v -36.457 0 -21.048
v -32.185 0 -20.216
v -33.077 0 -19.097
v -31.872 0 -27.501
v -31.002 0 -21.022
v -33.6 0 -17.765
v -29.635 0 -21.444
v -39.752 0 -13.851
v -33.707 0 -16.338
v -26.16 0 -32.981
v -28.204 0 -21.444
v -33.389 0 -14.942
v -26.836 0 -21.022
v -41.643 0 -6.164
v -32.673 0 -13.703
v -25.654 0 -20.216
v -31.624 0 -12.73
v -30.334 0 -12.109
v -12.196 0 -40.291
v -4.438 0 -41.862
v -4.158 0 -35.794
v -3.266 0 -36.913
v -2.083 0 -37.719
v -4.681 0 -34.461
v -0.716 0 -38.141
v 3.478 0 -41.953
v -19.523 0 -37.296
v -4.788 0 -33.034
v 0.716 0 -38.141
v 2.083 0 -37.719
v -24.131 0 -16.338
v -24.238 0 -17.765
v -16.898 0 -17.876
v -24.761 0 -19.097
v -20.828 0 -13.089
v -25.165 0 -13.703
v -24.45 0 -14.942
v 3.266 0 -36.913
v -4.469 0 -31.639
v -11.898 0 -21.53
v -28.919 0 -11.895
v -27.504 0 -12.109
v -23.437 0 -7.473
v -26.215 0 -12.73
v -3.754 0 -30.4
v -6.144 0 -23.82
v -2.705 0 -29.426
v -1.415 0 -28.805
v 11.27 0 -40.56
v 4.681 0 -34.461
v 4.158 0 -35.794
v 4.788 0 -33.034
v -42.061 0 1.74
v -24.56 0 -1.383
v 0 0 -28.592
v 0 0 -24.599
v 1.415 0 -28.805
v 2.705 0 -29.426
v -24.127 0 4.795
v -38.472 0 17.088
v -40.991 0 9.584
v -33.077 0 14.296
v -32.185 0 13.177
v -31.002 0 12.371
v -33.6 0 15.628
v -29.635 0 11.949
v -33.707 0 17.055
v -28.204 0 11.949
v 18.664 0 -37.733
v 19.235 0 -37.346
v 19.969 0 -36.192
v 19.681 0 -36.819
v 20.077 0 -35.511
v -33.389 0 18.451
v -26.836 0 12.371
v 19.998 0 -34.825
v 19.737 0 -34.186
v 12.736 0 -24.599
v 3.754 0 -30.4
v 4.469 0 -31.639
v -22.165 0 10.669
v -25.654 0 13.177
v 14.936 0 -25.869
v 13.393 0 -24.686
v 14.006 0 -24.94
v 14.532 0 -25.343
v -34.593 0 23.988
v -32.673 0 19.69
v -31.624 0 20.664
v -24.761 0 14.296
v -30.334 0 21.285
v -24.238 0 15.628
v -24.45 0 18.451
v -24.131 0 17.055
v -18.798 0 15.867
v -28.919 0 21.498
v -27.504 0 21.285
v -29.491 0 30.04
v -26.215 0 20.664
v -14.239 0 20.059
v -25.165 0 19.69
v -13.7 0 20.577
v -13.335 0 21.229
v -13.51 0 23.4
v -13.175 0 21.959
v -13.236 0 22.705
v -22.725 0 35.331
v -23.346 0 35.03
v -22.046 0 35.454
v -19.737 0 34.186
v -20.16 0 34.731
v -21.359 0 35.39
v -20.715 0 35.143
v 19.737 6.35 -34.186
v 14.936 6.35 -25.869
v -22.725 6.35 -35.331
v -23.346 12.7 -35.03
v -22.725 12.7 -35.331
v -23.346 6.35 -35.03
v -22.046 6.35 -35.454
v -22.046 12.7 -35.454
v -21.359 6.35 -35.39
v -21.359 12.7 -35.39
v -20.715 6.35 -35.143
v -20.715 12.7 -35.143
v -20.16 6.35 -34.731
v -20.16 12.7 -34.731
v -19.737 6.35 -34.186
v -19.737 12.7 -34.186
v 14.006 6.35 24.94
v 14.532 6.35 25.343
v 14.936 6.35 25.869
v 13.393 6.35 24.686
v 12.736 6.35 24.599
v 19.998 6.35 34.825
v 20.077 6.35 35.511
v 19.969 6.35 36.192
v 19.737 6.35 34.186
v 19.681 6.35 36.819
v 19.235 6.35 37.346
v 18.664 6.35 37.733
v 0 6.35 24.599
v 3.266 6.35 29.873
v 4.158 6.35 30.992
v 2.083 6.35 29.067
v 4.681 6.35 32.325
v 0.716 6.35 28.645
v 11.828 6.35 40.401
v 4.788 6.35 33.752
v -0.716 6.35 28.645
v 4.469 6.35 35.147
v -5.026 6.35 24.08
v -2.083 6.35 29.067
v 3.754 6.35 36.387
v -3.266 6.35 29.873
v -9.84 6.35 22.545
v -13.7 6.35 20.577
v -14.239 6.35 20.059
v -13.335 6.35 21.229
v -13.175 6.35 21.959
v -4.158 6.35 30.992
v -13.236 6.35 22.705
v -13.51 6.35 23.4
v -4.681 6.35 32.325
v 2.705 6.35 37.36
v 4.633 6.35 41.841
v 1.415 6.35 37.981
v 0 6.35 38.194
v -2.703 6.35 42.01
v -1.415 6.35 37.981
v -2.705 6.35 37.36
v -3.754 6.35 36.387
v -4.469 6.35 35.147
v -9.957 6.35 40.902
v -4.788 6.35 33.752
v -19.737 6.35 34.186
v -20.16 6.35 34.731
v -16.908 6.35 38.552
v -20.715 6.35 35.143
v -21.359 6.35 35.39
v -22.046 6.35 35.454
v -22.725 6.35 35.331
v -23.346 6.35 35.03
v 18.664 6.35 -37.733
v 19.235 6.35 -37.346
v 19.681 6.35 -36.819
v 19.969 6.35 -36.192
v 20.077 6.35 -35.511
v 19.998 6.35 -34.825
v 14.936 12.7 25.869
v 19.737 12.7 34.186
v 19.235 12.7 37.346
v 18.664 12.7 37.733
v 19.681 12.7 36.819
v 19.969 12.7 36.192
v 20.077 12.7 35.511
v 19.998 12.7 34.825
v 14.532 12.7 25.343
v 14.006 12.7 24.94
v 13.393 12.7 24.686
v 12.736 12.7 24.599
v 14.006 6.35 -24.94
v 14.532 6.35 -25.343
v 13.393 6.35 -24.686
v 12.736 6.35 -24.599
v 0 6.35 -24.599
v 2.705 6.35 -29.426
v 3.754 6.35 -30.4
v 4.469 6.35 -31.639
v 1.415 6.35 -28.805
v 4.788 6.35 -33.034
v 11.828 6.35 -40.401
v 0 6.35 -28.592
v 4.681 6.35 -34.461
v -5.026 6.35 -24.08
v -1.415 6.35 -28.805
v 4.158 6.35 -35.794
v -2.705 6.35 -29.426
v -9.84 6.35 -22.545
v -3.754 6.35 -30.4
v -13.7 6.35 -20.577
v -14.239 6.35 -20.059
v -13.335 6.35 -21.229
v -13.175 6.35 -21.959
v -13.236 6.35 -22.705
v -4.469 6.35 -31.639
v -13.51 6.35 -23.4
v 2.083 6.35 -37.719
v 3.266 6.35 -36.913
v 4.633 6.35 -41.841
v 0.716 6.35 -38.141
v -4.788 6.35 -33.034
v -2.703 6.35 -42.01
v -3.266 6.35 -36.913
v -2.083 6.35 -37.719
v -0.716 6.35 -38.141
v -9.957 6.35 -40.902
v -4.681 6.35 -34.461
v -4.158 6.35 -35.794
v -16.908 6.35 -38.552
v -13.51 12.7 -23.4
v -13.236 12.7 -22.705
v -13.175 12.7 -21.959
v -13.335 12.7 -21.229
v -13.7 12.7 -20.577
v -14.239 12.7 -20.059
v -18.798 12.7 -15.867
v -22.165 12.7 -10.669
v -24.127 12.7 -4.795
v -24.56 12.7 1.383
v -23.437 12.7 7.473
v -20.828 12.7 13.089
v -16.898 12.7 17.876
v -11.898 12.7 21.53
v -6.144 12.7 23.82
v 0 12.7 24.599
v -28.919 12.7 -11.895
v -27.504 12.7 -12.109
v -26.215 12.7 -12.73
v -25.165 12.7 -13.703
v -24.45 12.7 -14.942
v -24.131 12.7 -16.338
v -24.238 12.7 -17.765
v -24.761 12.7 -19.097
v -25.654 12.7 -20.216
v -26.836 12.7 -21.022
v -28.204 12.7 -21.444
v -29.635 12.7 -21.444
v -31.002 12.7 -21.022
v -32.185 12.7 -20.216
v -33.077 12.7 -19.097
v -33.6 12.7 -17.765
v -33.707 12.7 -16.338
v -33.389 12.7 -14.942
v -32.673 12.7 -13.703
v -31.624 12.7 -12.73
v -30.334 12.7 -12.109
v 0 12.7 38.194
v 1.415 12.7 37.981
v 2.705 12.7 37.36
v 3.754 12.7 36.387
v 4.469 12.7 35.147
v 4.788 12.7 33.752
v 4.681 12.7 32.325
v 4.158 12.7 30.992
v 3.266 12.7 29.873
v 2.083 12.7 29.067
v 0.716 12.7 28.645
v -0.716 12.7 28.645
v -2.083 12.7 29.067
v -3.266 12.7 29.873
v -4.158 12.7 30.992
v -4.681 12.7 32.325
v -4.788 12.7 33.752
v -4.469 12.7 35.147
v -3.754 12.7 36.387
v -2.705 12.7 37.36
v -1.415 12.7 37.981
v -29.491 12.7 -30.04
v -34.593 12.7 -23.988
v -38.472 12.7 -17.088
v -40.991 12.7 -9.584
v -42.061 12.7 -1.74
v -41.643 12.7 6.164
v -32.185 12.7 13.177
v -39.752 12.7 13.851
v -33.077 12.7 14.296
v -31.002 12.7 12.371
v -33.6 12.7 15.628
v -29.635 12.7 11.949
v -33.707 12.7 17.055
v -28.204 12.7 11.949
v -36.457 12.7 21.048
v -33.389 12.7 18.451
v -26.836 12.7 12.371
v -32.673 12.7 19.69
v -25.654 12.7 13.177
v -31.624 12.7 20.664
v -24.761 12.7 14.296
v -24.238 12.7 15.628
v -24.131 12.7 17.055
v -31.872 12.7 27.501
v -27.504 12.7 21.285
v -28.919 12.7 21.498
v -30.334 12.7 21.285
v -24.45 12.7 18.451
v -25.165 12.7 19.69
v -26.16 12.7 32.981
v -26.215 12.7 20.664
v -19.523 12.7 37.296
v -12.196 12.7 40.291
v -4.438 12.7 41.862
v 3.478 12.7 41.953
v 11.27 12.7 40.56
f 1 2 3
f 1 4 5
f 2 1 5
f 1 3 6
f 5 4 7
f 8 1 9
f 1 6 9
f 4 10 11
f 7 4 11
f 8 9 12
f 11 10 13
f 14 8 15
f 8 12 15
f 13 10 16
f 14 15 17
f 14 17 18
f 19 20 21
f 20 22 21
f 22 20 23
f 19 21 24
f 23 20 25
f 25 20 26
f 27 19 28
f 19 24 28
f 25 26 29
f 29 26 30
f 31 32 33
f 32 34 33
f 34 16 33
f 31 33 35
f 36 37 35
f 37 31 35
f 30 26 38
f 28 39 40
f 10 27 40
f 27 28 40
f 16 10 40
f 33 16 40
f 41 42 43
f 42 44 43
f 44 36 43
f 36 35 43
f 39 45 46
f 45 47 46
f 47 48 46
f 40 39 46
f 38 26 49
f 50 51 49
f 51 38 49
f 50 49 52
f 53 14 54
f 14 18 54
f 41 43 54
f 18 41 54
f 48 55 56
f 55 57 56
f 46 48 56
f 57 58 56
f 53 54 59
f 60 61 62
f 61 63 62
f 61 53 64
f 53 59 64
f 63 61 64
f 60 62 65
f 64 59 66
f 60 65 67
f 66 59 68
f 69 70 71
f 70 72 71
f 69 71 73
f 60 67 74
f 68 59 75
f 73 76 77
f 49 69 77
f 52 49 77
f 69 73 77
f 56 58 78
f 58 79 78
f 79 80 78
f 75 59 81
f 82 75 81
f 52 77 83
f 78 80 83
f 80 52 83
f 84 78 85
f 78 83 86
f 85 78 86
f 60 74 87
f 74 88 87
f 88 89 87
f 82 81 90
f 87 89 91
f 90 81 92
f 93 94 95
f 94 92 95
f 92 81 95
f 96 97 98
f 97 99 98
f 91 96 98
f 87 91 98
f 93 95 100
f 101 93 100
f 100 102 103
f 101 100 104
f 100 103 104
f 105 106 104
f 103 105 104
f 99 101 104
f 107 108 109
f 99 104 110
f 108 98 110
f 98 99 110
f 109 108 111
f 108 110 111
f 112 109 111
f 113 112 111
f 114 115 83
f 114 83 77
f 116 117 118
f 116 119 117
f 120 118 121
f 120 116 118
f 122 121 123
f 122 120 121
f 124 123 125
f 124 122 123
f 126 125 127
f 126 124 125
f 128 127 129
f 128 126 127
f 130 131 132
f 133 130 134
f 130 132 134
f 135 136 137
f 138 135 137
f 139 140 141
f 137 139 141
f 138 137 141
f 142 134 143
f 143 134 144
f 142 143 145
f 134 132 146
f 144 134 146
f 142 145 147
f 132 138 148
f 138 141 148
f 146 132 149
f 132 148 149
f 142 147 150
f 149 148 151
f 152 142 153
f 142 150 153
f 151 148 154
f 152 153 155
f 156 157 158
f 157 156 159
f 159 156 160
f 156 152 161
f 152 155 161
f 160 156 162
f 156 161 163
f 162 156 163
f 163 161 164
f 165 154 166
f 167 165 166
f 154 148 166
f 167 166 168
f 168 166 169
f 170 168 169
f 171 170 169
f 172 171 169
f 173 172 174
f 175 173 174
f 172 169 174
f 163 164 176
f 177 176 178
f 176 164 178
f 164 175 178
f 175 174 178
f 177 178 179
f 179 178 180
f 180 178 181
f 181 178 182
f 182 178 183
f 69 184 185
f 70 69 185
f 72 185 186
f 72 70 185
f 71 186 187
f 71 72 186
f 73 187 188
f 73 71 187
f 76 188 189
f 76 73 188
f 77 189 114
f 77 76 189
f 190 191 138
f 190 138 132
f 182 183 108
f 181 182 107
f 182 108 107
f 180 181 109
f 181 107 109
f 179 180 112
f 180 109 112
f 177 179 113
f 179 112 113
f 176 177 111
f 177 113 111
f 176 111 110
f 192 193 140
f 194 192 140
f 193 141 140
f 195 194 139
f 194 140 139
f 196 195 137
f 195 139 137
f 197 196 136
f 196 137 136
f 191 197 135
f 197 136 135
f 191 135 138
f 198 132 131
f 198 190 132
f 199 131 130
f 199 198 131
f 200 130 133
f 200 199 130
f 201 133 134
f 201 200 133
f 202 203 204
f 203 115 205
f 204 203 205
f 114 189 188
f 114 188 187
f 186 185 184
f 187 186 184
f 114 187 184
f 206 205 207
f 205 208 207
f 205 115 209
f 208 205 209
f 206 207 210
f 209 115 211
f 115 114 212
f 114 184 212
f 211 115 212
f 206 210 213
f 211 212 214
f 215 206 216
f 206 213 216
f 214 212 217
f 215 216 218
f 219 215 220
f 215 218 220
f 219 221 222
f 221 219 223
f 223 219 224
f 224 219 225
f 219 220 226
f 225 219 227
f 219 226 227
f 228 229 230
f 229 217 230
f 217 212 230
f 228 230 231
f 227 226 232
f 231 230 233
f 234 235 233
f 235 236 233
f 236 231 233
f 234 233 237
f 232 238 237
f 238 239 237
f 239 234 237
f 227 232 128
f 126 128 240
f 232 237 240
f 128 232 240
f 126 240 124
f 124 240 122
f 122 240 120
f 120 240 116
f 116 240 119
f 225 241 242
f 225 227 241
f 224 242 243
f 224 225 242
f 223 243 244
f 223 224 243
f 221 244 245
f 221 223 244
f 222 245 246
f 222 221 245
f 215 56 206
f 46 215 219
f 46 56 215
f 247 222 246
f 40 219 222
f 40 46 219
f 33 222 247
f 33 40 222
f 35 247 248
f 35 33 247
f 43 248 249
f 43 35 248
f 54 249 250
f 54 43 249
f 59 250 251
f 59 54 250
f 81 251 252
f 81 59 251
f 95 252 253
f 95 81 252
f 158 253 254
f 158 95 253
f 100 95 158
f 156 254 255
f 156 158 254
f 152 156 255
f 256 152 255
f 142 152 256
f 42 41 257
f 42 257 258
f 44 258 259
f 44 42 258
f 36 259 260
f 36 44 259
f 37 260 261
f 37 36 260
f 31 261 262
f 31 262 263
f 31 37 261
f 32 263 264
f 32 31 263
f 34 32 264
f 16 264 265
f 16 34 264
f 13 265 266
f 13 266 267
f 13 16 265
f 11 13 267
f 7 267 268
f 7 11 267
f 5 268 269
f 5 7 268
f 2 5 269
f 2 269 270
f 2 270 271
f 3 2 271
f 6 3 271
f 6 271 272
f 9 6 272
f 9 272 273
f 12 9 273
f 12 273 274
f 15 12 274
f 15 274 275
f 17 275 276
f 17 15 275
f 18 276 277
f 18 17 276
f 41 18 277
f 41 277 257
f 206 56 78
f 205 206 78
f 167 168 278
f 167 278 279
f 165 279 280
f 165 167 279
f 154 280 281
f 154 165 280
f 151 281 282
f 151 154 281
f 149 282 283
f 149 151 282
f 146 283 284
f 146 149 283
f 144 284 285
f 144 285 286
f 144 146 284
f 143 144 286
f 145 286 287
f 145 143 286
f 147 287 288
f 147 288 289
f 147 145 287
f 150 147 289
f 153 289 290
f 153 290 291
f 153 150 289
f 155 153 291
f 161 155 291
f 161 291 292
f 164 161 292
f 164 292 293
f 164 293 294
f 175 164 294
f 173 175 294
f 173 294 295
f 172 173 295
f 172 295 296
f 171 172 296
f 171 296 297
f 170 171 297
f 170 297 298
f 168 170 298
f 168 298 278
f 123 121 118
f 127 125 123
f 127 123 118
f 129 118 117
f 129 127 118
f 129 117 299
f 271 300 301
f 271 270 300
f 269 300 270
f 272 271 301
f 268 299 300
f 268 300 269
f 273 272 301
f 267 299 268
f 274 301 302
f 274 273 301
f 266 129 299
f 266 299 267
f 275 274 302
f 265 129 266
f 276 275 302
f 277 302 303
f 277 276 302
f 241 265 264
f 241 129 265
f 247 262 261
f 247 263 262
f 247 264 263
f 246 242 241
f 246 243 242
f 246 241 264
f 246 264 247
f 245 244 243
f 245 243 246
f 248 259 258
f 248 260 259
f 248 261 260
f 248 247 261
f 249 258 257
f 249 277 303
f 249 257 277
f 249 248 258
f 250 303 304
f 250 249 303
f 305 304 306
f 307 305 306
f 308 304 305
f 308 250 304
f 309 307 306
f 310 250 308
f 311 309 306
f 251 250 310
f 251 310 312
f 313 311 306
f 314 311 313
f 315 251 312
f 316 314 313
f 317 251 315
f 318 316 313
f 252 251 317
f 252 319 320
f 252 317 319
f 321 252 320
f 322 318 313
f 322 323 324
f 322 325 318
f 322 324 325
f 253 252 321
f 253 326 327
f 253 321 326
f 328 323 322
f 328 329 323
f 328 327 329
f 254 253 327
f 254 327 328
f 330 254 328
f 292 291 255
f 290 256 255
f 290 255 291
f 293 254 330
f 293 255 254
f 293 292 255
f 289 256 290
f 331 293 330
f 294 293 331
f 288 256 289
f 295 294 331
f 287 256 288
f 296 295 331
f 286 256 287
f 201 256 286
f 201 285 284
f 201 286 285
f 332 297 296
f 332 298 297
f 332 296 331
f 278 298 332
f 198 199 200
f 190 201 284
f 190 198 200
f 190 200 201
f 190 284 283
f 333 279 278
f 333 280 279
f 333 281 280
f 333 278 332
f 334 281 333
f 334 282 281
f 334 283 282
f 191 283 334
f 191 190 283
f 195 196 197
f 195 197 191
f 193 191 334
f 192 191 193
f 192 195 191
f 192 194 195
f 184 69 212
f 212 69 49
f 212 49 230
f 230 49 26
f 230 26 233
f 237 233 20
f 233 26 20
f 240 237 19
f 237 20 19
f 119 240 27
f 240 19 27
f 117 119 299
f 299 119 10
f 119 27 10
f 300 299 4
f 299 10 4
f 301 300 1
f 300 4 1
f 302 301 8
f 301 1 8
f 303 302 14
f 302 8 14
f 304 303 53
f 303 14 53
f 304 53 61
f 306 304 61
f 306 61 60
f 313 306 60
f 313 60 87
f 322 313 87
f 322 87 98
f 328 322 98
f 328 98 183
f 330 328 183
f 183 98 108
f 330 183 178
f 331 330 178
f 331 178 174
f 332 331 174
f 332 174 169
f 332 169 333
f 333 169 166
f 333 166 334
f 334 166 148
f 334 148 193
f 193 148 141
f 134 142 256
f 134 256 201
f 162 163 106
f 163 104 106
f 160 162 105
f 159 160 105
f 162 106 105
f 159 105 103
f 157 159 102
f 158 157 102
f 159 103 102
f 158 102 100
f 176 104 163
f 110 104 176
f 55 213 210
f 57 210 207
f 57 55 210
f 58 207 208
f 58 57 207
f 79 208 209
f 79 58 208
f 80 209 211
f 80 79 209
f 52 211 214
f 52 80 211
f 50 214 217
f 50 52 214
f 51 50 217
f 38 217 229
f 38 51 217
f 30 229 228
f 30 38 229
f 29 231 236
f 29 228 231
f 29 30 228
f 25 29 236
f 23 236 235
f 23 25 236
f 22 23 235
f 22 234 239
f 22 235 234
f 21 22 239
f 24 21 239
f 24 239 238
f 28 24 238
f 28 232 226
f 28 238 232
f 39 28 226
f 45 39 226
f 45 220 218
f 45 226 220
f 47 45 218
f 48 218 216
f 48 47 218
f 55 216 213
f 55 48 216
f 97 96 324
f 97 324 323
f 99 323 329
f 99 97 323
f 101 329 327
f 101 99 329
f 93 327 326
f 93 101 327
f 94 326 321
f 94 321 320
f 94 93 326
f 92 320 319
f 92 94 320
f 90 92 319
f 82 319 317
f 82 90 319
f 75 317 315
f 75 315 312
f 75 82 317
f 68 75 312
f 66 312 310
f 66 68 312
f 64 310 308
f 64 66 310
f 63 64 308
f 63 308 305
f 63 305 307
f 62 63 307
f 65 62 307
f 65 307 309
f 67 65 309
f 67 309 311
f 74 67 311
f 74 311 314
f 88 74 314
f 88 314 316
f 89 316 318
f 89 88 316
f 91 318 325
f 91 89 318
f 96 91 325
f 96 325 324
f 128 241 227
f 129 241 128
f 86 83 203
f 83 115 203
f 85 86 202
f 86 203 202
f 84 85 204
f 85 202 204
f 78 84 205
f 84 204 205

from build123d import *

# Parameters (mm, degrees)
SKETCH1_R      = 42.09650726
SKETCH1_R_2    = 24.599219473
SKETCH1_R_3    = 4.801304322
EXTRUDE1_DEPTH = 12.7
EXTRUDE2_DEPTH = 61.872997683
EXTRUDE3_DEPTH = 6.35
EXTRUDE4_DEPTH = 6.35
SKETCH6_W      = 38.310280967
SKETCH6_H      = 49.198438946
EXTRUDE5_DEPTH = 61.872997683
FILLET1_R      = 2.54
FILLET2_R      = 2.54


with BuildPart() as part:
    # Sketch1 → Extrude1 (new body)
    with BuildSketch(Plane(origin=(0, 0, 0), x_dir=(1, 0, 0), z_dir=(0, 1, 0))):
        with Locations(Location((0, 0, 0), (0, 0, 270))):
            Circle(SKETCH1_R)
        with Locations(Location((0, 0, 0), (0, 0, 270))):
            Circle(SKETCH1_R_2, mode=Mode.SUBTRACT)
        with Locations(Location((0, 33.393093385, 0), (0, 0, 270))):
            Circle(SKETCH1_R_3, mode=Mode.SUBTRACT)
        with Locations(Location((28.919267183, 16.696546693, 0), (0, 0, 270))):
            Circle(SKETCH1_R_3, mode=Mode.SUBTRACT)
        with Locations(Location((28.919267183, -16.696546693, 0), (0, 0, 270))):
            Circle(SKETCH1_R_3, mode=Mode.SUBTRACT)
        with Locations(Location((0, -33.393093385, 0), (0, 0, 270))):
            Circle(SKETCH1_R_3, mode=Mode.SUBTRACT)
        with Locations(Location((-28.919267183, -16.696546693, 0), (0, 0, 270))):
            Circle(SKETCH1_R_3, mode=Mode.SUBTRACT)
        with Locations(Location((-28.919267183, 16.696546693, 0), (0, 0, 270))):
            Circle(SKETCH1_R_3, mode=Mode.SUBTRACT)
    extrude(amount=EXTRUDE1_DEPTH)

    # Sketch3 → Extrude2 (cut, through all)
    with BuildSketch(Plane(origin=(0, 12.7, 0), x_dir=(1, 0, 0), z_dir=(0, 1, 0))):
        Polygon((0, 0), (28.178976679, 48.807419314), (52.099648294, 15.101619163), (29.402207, -50.926116379), align=None)
    extrude(amount=-EXTRUDE2_DEPTH, mode=Mode.SUBTRACT)

    # Sketch4 → Extrude3 (cut)
    with BuildSketch(Plane(origin=(0, 12.7, 0), x_dir=(1, 0, 0), z_dir=(0, 1, 0))):
        Polygon((0, 0), (-31.678815479, 54.869317933), (34.182730787, 54.869317933), align=None)
    extrude(amount=-EXTRUDE3_DEPTH, mode=Mode.SUBTRACT)

    # Sketch5 → Extrude4 (cut)
    with BuildSketch(Plane.XZ):
        Polygon((0, 0), (-26.213048705, 45.402332179), (26.21514135, 52.666998523), (26.748068273, 5.163813809), align=None)
    extrude(amount=-EXTRUDE4_DEPTH, mode=Mode.SUBTRACT)

    # Sketch6 → Extrude5 (cut, through all)
    with BuildSketch(Plane.XZ):
        with Locations((19.155140484, 0)):
            Rectangle(SKETCH6_W, SKETCH6_H)
    extrude(amount=-EXTRUDE5_DEPTH, mode=Mode.SUBTRACT)

    # Fillet1
    fillet1_edges = [part.edges().sort_by_distance(p)[0] for p in [
        (14.202365985, 3.175, -24.599219473),
        (14.202365985, 9.525, 24.599219473),
        (21.04825363, 3.175, -36.456644697),
        (21.04825363, 9.525, 36.456644697),
    ]]
    fillet(fillet1_edges, radius=FILLET1_R)

    # Fillet2
    fillet2_edges = [part.edges().sort_by_distance(p)[0] for p in [
        (-12.299609737, 9.525, -21.303548977),
        (-21.04825363, 9.525, -36.456644697),
        (-12.299609737, 3.175, 21.303548977),
        (-21.04825363, 3.175, 36.456644697),
    ]]
    fillet(fillet2_edges, radius=FILLET2_R)


solid = part.part
